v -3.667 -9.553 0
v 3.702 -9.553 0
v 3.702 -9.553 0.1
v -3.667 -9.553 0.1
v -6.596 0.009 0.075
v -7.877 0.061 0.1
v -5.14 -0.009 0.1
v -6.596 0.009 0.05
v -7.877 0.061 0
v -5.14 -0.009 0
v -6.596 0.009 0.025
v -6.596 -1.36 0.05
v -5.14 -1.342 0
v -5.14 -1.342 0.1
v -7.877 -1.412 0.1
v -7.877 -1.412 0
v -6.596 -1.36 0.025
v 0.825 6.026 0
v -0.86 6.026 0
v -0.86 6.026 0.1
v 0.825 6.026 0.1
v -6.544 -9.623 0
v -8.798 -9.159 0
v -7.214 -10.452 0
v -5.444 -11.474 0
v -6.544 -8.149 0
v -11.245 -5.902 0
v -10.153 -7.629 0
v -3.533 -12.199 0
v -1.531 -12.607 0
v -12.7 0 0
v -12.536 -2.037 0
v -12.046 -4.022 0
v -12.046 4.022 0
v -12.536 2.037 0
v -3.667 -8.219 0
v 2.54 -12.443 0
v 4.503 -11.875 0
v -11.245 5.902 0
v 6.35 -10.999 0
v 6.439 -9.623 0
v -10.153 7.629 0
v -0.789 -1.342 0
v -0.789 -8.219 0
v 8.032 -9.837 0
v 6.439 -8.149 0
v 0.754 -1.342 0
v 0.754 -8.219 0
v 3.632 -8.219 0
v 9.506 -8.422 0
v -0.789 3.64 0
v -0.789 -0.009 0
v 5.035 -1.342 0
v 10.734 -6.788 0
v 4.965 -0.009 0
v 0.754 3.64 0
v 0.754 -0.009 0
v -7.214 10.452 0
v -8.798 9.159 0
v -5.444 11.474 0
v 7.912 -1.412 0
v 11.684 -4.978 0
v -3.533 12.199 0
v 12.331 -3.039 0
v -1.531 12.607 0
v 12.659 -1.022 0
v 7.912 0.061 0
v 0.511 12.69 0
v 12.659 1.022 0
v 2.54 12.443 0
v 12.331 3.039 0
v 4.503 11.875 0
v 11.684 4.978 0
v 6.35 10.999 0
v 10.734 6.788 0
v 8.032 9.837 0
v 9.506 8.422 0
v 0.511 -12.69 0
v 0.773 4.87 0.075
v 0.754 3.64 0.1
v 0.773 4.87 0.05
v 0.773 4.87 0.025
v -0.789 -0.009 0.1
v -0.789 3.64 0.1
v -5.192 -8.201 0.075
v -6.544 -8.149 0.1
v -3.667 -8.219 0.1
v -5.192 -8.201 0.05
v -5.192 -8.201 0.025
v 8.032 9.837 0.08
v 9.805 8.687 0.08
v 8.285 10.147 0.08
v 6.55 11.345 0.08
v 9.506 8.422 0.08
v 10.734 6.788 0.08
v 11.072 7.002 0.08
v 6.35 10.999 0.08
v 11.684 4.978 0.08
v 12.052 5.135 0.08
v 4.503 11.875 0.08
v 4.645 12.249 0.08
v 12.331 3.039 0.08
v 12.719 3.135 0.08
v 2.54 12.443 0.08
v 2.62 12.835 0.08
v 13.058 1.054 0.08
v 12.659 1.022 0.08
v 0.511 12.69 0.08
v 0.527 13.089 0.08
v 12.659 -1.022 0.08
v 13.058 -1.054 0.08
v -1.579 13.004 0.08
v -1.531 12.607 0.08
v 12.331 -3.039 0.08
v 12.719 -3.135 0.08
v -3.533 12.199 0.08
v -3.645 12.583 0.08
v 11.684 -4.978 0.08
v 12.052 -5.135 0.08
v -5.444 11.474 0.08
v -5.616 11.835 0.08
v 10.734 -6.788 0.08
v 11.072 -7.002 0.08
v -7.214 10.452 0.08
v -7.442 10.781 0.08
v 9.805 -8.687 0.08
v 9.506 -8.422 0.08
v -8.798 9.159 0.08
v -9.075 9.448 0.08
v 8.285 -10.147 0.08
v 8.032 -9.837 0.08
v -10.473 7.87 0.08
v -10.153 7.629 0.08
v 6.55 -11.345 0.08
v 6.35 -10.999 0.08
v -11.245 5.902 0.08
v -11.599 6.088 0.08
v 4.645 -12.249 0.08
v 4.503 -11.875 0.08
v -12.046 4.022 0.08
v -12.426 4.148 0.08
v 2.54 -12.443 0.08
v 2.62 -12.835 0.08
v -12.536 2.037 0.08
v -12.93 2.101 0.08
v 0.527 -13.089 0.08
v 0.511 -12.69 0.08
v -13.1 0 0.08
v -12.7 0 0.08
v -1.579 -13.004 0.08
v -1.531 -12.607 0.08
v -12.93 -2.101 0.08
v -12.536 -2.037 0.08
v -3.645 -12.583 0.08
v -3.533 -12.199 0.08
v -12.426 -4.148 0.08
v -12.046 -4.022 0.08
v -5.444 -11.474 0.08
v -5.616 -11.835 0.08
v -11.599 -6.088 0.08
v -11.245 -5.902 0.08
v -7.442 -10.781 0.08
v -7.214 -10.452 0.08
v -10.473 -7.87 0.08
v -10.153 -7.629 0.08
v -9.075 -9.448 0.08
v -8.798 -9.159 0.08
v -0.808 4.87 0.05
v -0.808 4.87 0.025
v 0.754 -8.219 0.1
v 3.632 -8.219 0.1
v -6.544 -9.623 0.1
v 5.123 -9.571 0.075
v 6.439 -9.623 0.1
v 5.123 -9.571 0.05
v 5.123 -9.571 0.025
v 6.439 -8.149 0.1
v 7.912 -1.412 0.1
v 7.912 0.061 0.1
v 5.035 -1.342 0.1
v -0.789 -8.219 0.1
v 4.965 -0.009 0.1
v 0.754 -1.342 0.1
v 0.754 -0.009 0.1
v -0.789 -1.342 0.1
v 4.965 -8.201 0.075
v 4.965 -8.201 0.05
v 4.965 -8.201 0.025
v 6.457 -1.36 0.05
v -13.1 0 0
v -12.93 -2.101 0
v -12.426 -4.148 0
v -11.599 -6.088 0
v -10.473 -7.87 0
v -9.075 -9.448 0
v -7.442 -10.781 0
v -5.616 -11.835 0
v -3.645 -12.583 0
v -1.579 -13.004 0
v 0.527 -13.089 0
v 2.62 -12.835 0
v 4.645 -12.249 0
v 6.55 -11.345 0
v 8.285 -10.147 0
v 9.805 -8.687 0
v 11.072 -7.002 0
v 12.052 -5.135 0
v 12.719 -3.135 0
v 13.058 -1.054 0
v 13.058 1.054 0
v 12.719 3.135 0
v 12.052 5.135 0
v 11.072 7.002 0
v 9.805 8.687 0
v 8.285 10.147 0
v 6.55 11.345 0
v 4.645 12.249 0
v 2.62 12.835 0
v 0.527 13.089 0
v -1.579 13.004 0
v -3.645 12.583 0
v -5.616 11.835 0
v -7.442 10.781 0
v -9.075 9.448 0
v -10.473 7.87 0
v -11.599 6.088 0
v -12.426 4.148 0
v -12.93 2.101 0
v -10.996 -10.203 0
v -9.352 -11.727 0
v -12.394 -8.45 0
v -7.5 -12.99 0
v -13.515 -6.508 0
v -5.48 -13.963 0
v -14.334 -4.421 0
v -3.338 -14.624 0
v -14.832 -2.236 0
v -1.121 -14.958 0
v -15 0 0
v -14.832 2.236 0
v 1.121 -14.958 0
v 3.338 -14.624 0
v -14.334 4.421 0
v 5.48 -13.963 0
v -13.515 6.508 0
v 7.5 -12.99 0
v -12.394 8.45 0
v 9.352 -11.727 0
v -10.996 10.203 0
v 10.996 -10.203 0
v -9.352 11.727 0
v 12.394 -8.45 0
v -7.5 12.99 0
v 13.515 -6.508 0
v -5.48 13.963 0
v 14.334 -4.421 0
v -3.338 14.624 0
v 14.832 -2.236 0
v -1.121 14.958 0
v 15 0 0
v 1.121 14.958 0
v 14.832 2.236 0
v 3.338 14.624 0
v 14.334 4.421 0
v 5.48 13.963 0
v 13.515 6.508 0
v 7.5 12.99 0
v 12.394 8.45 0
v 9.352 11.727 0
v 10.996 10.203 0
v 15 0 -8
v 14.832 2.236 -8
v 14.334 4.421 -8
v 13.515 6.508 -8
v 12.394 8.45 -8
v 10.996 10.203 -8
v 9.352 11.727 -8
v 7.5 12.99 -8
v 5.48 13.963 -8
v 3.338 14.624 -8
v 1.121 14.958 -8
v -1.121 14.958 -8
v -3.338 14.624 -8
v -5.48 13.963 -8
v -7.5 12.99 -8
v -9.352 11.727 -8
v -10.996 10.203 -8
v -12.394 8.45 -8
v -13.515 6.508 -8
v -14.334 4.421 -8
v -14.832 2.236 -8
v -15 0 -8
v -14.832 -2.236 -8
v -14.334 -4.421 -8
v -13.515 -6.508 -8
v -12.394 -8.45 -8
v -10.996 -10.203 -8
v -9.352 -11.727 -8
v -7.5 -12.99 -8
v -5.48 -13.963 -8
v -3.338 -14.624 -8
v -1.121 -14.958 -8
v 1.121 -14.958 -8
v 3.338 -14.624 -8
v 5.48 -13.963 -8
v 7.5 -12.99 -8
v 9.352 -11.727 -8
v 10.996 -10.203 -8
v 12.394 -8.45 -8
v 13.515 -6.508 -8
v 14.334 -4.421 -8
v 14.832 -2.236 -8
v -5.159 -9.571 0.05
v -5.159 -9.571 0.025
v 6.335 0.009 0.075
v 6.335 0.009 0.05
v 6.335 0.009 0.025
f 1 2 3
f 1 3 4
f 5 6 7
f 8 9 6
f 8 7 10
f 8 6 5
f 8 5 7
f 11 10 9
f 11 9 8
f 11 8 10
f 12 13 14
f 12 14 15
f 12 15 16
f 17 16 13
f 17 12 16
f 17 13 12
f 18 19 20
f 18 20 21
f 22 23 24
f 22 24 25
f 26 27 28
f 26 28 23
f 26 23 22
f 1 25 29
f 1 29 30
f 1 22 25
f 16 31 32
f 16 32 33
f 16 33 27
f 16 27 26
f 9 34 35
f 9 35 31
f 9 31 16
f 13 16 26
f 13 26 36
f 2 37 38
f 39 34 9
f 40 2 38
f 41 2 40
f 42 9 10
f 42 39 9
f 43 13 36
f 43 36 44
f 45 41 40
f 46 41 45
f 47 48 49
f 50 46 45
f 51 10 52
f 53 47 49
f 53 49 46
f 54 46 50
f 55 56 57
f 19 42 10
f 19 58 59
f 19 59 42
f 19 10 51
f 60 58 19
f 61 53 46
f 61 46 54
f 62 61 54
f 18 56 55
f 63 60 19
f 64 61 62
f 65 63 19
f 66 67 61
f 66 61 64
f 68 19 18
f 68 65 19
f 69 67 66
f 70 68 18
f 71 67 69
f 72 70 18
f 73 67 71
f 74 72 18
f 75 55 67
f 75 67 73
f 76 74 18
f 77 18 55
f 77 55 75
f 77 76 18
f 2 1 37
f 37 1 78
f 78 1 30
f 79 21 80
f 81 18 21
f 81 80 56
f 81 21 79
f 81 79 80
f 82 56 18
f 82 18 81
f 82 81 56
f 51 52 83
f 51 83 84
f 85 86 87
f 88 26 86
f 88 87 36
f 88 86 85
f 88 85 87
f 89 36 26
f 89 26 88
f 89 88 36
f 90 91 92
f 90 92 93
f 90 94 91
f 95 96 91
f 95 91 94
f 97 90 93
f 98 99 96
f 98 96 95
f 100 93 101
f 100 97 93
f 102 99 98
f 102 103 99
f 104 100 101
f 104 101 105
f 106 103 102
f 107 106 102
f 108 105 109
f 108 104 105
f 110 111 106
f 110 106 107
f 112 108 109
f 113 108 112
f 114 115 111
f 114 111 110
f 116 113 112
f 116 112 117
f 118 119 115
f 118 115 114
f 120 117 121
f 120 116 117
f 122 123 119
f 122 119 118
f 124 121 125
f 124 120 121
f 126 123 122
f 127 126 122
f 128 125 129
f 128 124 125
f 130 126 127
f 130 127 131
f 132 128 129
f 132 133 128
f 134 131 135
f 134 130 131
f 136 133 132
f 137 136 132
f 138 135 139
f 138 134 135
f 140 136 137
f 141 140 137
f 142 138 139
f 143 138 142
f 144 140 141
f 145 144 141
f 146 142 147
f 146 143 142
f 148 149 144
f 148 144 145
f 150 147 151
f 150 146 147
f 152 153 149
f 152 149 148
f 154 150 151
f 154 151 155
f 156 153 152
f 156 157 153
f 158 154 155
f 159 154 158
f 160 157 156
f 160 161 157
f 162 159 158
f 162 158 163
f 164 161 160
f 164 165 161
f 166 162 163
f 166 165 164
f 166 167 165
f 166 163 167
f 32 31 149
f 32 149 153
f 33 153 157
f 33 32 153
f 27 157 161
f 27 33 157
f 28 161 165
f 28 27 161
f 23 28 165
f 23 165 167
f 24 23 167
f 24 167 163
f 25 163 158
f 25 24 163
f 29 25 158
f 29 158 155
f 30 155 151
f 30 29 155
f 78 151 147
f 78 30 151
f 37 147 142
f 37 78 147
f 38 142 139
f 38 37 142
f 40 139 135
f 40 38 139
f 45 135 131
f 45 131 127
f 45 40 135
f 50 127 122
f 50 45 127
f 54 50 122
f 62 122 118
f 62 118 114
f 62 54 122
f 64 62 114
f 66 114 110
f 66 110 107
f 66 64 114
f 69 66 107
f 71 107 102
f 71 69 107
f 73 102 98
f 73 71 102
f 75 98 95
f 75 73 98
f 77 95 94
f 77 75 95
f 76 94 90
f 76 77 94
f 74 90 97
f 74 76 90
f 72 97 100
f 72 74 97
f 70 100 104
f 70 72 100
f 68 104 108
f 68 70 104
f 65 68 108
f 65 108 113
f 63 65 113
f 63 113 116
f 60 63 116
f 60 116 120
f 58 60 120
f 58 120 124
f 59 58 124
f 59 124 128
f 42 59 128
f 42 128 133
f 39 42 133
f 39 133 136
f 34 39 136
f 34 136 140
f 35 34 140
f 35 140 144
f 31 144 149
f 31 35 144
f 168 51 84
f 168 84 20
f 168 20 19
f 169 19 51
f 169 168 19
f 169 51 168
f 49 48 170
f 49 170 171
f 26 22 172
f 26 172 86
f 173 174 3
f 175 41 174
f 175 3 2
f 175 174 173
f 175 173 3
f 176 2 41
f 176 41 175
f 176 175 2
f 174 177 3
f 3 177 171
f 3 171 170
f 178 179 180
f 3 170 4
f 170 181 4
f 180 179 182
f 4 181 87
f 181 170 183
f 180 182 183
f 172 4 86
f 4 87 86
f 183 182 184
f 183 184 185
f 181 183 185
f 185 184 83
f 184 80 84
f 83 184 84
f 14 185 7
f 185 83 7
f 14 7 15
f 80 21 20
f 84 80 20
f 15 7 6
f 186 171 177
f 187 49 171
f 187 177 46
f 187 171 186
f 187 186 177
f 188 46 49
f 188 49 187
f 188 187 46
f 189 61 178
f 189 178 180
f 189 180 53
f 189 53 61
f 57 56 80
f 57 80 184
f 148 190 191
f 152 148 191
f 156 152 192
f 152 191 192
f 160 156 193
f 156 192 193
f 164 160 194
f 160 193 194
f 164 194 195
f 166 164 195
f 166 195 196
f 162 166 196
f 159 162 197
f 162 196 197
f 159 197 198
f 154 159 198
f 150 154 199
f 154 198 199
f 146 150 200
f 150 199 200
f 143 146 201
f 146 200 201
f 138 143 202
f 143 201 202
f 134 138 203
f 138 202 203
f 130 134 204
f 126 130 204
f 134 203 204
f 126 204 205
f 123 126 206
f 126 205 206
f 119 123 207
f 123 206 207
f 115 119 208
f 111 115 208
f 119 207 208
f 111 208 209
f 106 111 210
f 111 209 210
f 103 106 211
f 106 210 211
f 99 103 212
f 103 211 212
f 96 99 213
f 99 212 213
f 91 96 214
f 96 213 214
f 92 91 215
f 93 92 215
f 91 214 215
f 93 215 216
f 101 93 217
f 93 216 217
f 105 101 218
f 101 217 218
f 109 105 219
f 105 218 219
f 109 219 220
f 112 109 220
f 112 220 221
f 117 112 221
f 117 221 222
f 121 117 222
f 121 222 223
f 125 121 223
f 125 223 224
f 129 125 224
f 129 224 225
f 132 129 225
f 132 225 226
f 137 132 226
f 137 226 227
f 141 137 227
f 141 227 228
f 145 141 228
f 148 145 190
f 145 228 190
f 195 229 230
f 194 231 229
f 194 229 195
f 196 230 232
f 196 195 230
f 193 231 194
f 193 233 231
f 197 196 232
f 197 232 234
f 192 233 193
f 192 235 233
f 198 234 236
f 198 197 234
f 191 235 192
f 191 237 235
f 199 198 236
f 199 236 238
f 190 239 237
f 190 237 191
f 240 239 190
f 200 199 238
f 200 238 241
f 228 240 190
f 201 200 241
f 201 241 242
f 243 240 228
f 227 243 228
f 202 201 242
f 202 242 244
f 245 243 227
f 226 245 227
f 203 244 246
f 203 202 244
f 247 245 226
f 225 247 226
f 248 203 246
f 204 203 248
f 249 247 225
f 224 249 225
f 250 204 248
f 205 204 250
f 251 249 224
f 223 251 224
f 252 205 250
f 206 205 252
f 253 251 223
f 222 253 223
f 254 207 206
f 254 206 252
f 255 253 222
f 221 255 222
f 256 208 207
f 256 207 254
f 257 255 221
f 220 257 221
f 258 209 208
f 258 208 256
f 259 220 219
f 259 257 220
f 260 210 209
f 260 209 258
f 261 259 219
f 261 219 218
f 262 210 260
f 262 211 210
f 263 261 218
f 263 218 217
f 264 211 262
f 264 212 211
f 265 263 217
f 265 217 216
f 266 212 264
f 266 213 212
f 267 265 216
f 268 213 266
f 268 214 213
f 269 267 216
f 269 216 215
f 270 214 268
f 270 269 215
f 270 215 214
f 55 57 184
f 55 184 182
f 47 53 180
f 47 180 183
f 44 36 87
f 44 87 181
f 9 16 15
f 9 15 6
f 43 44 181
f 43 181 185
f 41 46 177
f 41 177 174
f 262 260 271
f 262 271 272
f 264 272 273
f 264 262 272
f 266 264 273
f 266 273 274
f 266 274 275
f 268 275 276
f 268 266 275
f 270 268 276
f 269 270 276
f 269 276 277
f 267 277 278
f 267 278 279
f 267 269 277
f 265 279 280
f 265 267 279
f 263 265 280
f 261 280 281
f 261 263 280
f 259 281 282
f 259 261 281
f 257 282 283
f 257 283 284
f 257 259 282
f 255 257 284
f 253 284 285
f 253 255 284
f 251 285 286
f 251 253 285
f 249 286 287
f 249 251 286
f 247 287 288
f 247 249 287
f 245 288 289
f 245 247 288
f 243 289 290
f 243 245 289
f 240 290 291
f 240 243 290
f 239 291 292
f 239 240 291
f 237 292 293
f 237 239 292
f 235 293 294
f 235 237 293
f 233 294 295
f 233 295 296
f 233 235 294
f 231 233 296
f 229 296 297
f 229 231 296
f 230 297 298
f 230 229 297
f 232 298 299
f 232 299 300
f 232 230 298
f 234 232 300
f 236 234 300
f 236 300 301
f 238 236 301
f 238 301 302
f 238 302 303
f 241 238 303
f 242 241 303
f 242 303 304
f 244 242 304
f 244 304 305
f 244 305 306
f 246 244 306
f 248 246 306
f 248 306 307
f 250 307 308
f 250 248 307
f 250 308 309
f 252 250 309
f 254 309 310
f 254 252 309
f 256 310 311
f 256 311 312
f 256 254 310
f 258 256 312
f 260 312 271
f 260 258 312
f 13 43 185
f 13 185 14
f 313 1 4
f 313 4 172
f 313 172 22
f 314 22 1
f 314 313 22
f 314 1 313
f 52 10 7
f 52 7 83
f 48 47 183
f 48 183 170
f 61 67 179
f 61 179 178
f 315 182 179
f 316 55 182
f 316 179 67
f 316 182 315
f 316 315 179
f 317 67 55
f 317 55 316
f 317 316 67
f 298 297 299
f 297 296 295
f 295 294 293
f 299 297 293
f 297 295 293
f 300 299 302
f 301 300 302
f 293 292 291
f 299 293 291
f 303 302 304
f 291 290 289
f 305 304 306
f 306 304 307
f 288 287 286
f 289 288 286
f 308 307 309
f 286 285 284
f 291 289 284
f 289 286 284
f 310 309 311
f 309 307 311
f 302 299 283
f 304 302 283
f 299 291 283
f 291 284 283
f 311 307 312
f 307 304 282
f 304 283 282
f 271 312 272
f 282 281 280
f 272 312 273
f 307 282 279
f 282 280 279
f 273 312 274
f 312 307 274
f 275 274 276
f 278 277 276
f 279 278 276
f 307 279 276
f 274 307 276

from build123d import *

# Parameters (mm, degrees)
SKETCH_1_R               = 15
DIAMETER30_HEIGHT8_DEPTH = 8
CHARACTER_DEPTH          = 0.1
SKETCH_3_R               = 13.1
SKETCH_3_R_2             = 12.7
INK_RING_DEPTH           = 0.08


with BuildPart() as part:
    # 草图1 → Diameter30_Height8 (new body)
    with BuildSketch(Plane.XY):
        Circle(SKETCH_1_R)
    extrude(amount=-DIAMETER30_HEIGHT8_DEPTH)

    # 草图2 → Character_士 (add)
    with BuildSketch(Plane.XY):
        with BuildLine():
            add(Edge.make_bspline(
                [(0.824561404, 6.026315789), (0.813336636, 5.83662132), (0.790538423, 5.45133988), (0.771428603, 4.863755794), (0.757740418, 4.258132362), (0.755515021, 3.84828648), (0.754385965, 3.640350877)],
                knots=[0, 0, 0, 0, 0.955126267, 1.939921735, 2.954817811, 4, 4, 4, 4], degree=3))
            Line((0.754385965, 3.640350877), (0.754385965, -0.00877193))
            Line((0.754385965, -0.00877193), (4.964912281, -0.00877193))
            add(Edge.make_bspline(
                [(4.964912281, -0.00877193), (5.184108112, -0.007529011), (5.640726, -0.004939824), (6.351162704, 0.009012072), (7.114519154, 0.028890494), (7.640265954, 0.050317465), (7.912280702, 0.061403509)],
                knots=[0, 0, 0, 0, 0.89213577, 1.858452998, 2.891990654, 4, 4, 4, 4], degree=3))
            Line((7.912280702, 0.061403509), (7.912280702, -1.412280702))
            add(Edge.make_bspline(
                [(7.912280702, -1.412280702), (7.427185378, -1.392141242), (6.468519002, -1.352340771), (5.509053521, -1.345489646), (5.035087719, -1.342105263)],
                knots=[0, 0, 0, 0, 1.012021148, 2, 2, 2, 2], degree=3))
            Line((5.035087719, -1.342105263), (0.754385965, -1.342105263))
            Line((0.754385965, -1.342105263), (0.754385965, -8.219298246))
            Line((0.754385965, -8.219298246), (3.631578947, -8.219298246))
            add(Edge.make_bspline(
                [(3.631578947, -8.219298246), (3.848176317, -8.218087826), (4.292668001, -8.215603856), (4.977115293, -8.20161515), (5.696306453, -8.181989949), (6.187377565, -8.160246287), (6.438596491, -8.149122807)],
                knots=[0, 0, 0, 0, 0.925596292, 1.899468382, 2.925423867, 4, 4, 4, 4], degree=3))
            Line((6.438596491, -8.149122807), (6.438596491, -9.622807018))
            add(Edge.make_bspline(
                [(6.438596491, -9.622807018), (6.22377323, -9.611572963), (5.785618359, -9.588659914), (5.114015233, -9.569582266), (4.416560018, -9.555980066), (3.942610691, -9.553759864), (3.701754386, -9.552631579)],
                knots=[0, 0, 0, 0, 0.942753637, 1.922846234, 2.944411245, 4, 4, 4, 4], degree=3))
            Line((3.701754386, -9.552631579), (-3.666666667, -9.552631579))
            add(Edge.make_bspline(
                [(-3.666666667, -9.552631579), (-3.919651707, -9.553757661), (-4.416990585, -9.555971406), (-5.149099093, -9.569586009), (-5.855343836, -9.588750323), (-6.316905199, -9.61158096), (-6.543859649, -9.622807018)],
                knots=[0, 0, 0, 0, 1.05470571, 2.07342756, 3.052684594, 4, 4, 4, 4], degree=3))
            Line((-6.543859649, -9.622807018), (-6.543859649, -8.149122807))
            add(Edge.make_bspline(
                [(-6.543859649, -8.149122807), (-6.326438065, -8.160395624), (-5.876165846, -8.183741218), (-5.178554503, -8.202420094), (-4.436918096, -8.216076814), (-3.928315814, -8.218203947), (-3.666666667, -8.219298246)],
                knots=[0, 0, 0, 0, 0.907617697, 1.879643343, 2.909187922, 4, 4, 4, 4], degree=3))
            Line((-3.666666667, -8.219298246), (-0.789473684, -8.219298246))
            Line((-0.789473684, -8.219298246), (-0.789473684, -1.342105263))
            Line((-0.789473684, -1.342105263), (-5.140350877, -1.342105263))
            add(Edge.make_bspline(
                [(-5.140350877, -1.342105263), (-5.390737734, -1.343192376), (-5.875950755, -1.345299041), (-6.582068481, -1.358952048), (-7.244168345, -1.377670192), (-7.671036038, -1.401009107), (-7.877192982, -1.412280702)],
                knots=[0, 0, 0, 0, 1.097340975, 2.126485934, 3.095181147, 4, 4, 4, 4], degree=3))
            Line((-7.877192982, -1.412280702), (-7.877192982, 0.061403509))
            add(Edge.make_bspline(
                [(-7.877192982, 0.061403509), (-7.671036038, 0.050131914), (-7.244168345, 0.026792999), (-6.582068481, 0.008074855), (-5.875950755, -0.005578152), (-5.390737734, -0.007684817), (-5.140350877, -0.00877193)],
                knots=[0, 0, 0, 0, 0.904818853, 1.873514066, 2.902659025, 4, 4, 4, 4], degree=3))
            Line((-5.140350877, -0.00877193), (-0.789473684, -0.00877193))
            Line((-0.789473684, -0.00877193), (-0.789473684, 3.640350877))
            add(Edge.make_bspline(
                [(-0.789473684, 3.640350877), (-0.790602741, 3.84828648), (-0.792828137, 4.258132362), (-0.806516322, 4.863755794), (-0.825626143, 5.45133988), (-0.848424355, 5.83662132), (-0.859649123, 6.026315789)],
                knots=[0, 0, 0, 0, 1.045182189, 2.060078265, 3.044873733, 4, 4, 4, 4], degree=3))
            Line((-0.859649123, 6.026315789), (0.824561404, 6.026315789))
        make_face()
    extrude(amount=CHARACTER_DEPTH)

    # 草图3 → Ink_ring (add)
    with BuildSketch(Plane.XY):
        with Locations(Location((0, 0, 0), (0, 0, 180))):
            Circle(SKETCH_3_R)
        with Locations(Location((0, 0, 0), (0, 0, 180))):
            Circle(SKETCH_3_R_2, mode=Mode.SUBTRACT)
    extrude(amount=INK_RING_DEPTH)


solid = part.part
